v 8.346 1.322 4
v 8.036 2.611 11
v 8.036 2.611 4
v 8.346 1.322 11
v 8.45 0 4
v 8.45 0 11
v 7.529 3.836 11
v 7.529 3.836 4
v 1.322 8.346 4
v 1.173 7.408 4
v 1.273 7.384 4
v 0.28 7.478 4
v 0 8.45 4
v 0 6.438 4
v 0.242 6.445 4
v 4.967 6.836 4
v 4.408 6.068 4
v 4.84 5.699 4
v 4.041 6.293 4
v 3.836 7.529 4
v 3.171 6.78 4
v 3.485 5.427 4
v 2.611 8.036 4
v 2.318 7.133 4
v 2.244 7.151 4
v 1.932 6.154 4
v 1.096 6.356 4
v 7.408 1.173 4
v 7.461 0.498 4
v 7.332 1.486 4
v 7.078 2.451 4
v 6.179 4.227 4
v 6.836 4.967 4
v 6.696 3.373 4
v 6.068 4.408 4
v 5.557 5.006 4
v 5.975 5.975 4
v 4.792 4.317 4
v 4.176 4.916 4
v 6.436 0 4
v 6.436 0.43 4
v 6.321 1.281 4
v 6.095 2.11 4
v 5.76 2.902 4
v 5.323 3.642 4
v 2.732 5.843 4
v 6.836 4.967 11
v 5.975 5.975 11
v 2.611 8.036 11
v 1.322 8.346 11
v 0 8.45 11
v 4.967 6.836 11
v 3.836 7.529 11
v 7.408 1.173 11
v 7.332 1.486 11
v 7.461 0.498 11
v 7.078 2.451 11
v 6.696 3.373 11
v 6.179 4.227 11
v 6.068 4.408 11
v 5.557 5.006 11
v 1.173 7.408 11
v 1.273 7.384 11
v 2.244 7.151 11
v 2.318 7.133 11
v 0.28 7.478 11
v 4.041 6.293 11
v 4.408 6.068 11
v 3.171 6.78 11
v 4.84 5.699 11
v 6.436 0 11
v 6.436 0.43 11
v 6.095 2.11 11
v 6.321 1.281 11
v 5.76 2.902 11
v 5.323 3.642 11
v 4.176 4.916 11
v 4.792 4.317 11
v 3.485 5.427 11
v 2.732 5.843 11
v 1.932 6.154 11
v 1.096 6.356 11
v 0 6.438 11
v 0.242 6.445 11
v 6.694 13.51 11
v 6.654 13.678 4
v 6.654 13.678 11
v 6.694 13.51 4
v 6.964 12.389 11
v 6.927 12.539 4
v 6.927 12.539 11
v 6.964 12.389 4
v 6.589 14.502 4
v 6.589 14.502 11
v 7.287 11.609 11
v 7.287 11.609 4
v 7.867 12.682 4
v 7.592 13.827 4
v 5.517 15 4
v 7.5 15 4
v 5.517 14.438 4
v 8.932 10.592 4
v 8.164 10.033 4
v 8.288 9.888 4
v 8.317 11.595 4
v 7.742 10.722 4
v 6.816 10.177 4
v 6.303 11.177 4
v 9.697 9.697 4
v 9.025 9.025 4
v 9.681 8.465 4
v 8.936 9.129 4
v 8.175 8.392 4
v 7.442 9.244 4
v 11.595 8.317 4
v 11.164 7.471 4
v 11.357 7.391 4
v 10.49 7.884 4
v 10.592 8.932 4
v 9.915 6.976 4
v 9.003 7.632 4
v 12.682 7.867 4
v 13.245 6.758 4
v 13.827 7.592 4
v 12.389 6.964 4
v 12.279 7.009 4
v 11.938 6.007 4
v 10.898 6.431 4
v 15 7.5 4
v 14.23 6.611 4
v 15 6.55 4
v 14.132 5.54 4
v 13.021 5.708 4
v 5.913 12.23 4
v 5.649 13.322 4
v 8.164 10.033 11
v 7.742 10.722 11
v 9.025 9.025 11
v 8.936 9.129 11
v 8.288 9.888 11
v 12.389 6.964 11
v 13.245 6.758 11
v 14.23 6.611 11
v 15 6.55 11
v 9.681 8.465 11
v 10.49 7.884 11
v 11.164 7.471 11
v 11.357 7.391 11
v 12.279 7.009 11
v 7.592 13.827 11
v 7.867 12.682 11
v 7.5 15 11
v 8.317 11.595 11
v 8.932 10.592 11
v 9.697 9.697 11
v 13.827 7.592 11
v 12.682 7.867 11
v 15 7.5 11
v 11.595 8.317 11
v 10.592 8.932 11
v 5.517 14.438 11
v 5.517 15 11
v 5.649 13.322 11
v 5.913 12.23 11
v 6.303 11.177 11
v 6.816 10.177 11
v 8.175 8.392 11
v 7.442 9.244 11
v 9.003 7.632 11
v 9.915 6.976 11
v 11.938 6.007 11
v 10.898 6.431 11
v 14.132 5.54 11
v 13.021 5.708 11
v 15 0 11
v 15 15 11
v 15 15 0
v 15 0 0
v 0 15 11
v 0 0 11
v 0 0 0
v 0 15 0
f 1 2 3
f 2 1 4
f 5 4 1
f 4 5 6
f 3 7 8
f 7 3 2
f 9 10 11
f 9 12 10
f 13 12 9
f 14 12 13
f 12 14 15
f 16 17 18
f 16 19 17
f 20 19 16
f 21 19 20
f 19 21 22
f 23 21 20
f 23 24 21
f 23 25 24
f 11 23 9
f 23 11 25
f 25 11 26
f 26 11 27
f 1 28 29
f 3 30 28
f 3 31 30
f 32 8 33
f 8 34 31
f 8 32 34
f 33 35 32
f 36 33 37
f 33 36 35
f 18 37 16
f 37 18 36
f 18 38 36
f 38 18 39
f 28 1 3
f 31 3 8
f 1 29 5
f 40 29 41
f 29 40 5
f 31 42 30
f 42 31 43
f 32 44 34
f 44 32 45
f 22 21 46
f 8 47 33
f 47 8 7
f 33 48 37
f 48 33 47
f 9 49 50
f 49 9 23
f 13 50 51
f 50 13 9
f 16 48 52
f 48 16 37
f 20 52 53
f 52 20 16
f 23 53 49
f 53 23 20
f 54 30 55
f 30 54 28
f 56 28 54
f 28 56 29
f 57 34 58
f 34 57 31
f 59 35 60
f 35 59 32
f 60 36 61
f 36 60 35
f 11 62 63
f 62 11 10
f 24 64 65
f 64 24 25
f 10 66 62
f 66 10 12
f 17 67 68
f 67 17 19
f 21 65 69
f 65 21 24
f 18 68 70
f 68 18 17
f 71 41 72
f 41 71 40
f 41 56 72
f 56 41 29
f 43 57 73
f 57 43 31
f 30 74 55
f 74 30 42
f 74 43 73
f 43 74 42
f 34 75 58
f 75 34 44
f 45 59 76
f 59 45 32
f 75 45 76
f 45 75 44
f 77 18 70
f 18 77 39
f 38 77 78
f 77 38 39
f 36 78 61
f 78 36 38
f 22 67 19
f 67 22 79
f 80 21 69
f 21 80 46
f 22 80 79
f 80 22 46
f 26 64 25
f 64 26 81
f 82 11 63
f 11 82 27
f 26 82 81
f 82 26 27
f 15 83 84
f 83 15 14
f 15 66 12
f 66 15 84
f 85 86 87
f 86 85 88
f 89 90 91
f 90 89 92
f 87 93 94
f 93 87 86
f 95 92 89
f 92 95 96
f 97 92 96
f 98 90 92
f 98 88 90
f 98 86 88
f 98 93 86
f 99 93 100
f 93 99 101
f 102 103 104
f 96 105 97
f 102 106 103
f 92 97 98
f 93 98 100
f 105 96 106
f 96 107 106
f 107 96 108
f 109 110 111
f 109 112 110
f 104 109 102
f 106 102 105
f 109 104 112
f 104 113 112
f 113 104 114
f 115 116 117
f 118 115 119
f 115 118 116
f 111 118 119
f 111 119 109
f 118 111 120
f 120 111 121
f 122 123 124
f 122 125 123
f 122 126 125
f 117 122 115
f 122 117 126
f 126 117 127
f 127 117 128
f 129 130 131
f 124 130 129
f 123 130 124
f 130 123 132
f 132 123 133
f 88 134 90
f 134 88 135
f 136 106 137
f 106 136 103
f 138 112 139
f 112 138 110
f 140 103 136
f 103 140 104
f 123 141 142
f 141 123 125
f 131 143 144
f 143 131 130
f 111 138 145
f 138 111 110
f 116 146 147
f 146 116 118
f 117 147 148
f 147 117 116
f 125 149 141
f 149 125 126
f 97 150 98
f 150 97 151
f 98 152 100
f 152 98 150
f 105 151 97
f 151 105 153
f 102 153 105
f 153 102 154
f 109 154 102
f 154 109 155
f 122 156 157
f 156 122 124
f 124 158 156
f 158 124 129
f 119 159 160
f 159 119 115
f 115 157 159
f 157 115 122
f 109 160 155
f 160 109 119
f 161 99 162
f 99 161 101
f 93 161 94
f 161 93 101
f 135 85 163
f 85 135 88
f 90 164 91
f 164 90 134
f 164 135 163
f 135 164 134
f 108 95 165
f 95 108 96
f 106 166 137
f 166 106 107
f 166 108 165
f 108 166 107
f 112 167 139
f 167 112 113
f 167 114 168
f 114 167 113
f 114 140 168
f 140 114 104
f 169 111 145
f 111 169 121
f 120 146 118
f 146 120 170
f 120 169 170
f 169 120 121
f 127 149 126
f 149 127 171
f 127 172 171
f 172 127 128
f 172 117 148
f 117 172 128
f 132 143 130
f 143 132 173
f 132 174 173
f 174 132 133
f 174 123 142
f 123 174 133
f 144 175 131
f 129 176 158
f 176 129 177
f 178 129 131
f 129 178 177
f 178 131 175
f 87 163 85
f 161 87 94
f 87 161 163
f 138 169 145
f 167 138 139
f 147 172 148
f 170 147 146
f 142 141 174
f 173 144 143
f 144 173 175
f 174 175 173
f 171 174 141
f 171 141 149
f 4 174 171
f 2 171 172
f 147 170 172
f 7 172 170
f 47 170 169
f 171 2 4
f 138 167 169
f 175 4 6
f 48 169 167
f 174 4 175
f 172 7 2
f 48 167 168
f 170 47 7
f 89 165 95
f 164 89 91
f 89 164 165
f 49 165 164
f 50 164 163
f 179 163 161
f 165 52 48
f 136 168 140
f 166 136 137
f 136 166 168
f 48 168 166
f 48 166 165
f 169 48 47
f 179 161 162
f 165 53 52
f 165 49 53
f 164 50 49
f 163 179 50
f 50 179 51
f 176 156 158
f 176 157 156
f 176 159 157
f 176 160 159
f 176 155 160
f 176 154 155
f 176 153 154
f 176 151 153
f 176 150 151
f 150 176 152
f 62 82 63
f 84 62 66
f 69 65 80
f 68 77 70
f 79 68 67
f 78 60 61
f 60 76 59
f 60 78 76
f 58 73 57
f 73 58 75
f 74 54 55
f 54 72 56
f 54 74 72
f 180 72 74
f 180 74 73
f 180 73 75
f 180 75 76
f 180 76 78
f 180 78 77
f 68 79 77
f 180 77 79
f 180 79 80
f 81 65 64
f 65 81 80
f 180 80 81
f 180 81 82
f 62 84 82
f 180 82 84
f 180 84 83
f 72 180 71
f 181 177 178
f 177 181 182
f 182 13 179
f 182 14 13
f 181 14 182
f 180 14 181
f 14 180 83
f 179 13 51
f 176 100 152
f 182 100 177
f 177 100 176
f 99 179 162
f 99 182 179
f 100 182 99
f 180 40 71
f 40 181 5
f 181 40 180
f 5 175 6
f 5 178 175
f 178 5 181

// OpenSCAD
/* [Global] */

// typically 6 (mm)
belt_width = 6; // [3:15]

// should slightly less than actual belt thickness for compression fit, typically 1 - 0.05 (mm)           
belt_thickness = 0.95;

// - tooth pitch on the belt, 2 for GT2 (mm)
belt_pitch = 2.0;                  

// - belt tooth radius, 0.8 for GT2 (mm) - original version only
tooth_radius = 0.8;                

// - belt tooth length (mm) - remized version only
tooth_length = 2;                    

// (overall clamp width, mm)
clamp_width = 15;
// (overall clamp height, mm)
clamp_length = 15;
// (overall clamp base thickness, mm)
clamp_base = 4;

show = 1; // [1:remixed,2:original,3:both]

//////////////////////////////////////////////////////////////////////////////

/* [Hidden] */

path_height = belt_width + 1;
clamp_thickness = path_height+clamp_base;

$fn = 40;

clamp_inside_radius = clamp_width/2;
clamp_outside_radius = clamp_inside_radius+belt_thickness;
dTheta_inside = belt_pitch/clamp_inside_radius;
dTheta_outside = belt_pitch/clamp_outside_radius;
pi = 3.14159;

small = 0.01;  // avoid graphical artifacts with coincident faces

module tube(r1, r2, h) {
  difference() {
    cylinder(h=h,r=r2);
    translate([0, 0, -1]) cylinder(h=h+2,r=r1);
	echo(h);
  }
}

module belt_cutout(clamp_radius, dTheta) {
  // Belt paths
  tube(r1=clamp_inside_radius,r2=clamp_outside_radius,h=path_height+small);
  for (theta = [0:dTheta:pi/2]) {
    translate([clamp_radius*cos(theta*180/pi),clamp_radius*sin(theta*180/pi),0]) cylinder(r=tooth_radius, h=path_height+small);
  }
}

module belt_clips() {
  difference() {
    cube([clamp_width,clamp_length,clamp_thickness]);
    translate([0,0,clamp_base]) {
      belt_cutout(clamp_inside_radius, dTheta_inside);
      translate([clamp_width,clamp_length,0]) rotate([0, 0, 180])
        belt_cutout(clamp_outside_radius, dTheta_outside);
    }
  };
}

module belt_cutout2(clamp_in, clamp_mid, clamp_out, dTheta) {
  // Belt paths
  tube(r1=min(clamp_in, clamp_mid),r2=max(clamp_in, clamp_mid),h=path_height+1);

  for (theta = [-dTheta/4:dTheta:pi/2+dTheta/4]) {
    linear_extrude(height=path_height+small, center=false) {
      polygon(points = [
        [cos(theta*180/pi) * clamp_out, sin(theta*180/pi) * clamp_out], 
        [cos(theta*180/pi) * ((clamp_in+clamp_mid)/2), sin(theta*180/pi) * ((clamp_in+clamp_mid)/2)], 
        [cos((theta+dTheta/2)*180/pi) * ((clamp_in+clamp_mid)/2), sin((theta+dTheta/2)*180/pi) * ((clamp_in+clamp_mid)/2)],
        [cos((theta+dTheta/2)*180/pi) * clamp_out, sin((theta+dTheta/2)*180/pi) * clamp_out]
      ]);
    }
  }
}

module belt_clips2() {
  difference() {
    cube([clamp_width,clamp_length,clamp_thickness]);
    translate([0,0,clamp_base]) {
      belt_cutout2(clamp_inside_radius, clamp_outside_radius, clamp_outside_radius-tooth_length, dTheta_inside);
      translate([clamp_width,clamp_length,0]) rotate([0, 0, 180])
        belt_cutout2(clamp_outside_radius, clamp_inside_radius, clamp_inside_radius+tooth_length, dTheta_outside);
    }
  };
}

if((show == 1) || (show == 3))
	belt_clips2();

if(show == 3)
	translate([-clamp_width-3,-clamp_length-3,0]) color([1,0,0])
		belt_clips();
if(show == 2)
	belt_clips();
